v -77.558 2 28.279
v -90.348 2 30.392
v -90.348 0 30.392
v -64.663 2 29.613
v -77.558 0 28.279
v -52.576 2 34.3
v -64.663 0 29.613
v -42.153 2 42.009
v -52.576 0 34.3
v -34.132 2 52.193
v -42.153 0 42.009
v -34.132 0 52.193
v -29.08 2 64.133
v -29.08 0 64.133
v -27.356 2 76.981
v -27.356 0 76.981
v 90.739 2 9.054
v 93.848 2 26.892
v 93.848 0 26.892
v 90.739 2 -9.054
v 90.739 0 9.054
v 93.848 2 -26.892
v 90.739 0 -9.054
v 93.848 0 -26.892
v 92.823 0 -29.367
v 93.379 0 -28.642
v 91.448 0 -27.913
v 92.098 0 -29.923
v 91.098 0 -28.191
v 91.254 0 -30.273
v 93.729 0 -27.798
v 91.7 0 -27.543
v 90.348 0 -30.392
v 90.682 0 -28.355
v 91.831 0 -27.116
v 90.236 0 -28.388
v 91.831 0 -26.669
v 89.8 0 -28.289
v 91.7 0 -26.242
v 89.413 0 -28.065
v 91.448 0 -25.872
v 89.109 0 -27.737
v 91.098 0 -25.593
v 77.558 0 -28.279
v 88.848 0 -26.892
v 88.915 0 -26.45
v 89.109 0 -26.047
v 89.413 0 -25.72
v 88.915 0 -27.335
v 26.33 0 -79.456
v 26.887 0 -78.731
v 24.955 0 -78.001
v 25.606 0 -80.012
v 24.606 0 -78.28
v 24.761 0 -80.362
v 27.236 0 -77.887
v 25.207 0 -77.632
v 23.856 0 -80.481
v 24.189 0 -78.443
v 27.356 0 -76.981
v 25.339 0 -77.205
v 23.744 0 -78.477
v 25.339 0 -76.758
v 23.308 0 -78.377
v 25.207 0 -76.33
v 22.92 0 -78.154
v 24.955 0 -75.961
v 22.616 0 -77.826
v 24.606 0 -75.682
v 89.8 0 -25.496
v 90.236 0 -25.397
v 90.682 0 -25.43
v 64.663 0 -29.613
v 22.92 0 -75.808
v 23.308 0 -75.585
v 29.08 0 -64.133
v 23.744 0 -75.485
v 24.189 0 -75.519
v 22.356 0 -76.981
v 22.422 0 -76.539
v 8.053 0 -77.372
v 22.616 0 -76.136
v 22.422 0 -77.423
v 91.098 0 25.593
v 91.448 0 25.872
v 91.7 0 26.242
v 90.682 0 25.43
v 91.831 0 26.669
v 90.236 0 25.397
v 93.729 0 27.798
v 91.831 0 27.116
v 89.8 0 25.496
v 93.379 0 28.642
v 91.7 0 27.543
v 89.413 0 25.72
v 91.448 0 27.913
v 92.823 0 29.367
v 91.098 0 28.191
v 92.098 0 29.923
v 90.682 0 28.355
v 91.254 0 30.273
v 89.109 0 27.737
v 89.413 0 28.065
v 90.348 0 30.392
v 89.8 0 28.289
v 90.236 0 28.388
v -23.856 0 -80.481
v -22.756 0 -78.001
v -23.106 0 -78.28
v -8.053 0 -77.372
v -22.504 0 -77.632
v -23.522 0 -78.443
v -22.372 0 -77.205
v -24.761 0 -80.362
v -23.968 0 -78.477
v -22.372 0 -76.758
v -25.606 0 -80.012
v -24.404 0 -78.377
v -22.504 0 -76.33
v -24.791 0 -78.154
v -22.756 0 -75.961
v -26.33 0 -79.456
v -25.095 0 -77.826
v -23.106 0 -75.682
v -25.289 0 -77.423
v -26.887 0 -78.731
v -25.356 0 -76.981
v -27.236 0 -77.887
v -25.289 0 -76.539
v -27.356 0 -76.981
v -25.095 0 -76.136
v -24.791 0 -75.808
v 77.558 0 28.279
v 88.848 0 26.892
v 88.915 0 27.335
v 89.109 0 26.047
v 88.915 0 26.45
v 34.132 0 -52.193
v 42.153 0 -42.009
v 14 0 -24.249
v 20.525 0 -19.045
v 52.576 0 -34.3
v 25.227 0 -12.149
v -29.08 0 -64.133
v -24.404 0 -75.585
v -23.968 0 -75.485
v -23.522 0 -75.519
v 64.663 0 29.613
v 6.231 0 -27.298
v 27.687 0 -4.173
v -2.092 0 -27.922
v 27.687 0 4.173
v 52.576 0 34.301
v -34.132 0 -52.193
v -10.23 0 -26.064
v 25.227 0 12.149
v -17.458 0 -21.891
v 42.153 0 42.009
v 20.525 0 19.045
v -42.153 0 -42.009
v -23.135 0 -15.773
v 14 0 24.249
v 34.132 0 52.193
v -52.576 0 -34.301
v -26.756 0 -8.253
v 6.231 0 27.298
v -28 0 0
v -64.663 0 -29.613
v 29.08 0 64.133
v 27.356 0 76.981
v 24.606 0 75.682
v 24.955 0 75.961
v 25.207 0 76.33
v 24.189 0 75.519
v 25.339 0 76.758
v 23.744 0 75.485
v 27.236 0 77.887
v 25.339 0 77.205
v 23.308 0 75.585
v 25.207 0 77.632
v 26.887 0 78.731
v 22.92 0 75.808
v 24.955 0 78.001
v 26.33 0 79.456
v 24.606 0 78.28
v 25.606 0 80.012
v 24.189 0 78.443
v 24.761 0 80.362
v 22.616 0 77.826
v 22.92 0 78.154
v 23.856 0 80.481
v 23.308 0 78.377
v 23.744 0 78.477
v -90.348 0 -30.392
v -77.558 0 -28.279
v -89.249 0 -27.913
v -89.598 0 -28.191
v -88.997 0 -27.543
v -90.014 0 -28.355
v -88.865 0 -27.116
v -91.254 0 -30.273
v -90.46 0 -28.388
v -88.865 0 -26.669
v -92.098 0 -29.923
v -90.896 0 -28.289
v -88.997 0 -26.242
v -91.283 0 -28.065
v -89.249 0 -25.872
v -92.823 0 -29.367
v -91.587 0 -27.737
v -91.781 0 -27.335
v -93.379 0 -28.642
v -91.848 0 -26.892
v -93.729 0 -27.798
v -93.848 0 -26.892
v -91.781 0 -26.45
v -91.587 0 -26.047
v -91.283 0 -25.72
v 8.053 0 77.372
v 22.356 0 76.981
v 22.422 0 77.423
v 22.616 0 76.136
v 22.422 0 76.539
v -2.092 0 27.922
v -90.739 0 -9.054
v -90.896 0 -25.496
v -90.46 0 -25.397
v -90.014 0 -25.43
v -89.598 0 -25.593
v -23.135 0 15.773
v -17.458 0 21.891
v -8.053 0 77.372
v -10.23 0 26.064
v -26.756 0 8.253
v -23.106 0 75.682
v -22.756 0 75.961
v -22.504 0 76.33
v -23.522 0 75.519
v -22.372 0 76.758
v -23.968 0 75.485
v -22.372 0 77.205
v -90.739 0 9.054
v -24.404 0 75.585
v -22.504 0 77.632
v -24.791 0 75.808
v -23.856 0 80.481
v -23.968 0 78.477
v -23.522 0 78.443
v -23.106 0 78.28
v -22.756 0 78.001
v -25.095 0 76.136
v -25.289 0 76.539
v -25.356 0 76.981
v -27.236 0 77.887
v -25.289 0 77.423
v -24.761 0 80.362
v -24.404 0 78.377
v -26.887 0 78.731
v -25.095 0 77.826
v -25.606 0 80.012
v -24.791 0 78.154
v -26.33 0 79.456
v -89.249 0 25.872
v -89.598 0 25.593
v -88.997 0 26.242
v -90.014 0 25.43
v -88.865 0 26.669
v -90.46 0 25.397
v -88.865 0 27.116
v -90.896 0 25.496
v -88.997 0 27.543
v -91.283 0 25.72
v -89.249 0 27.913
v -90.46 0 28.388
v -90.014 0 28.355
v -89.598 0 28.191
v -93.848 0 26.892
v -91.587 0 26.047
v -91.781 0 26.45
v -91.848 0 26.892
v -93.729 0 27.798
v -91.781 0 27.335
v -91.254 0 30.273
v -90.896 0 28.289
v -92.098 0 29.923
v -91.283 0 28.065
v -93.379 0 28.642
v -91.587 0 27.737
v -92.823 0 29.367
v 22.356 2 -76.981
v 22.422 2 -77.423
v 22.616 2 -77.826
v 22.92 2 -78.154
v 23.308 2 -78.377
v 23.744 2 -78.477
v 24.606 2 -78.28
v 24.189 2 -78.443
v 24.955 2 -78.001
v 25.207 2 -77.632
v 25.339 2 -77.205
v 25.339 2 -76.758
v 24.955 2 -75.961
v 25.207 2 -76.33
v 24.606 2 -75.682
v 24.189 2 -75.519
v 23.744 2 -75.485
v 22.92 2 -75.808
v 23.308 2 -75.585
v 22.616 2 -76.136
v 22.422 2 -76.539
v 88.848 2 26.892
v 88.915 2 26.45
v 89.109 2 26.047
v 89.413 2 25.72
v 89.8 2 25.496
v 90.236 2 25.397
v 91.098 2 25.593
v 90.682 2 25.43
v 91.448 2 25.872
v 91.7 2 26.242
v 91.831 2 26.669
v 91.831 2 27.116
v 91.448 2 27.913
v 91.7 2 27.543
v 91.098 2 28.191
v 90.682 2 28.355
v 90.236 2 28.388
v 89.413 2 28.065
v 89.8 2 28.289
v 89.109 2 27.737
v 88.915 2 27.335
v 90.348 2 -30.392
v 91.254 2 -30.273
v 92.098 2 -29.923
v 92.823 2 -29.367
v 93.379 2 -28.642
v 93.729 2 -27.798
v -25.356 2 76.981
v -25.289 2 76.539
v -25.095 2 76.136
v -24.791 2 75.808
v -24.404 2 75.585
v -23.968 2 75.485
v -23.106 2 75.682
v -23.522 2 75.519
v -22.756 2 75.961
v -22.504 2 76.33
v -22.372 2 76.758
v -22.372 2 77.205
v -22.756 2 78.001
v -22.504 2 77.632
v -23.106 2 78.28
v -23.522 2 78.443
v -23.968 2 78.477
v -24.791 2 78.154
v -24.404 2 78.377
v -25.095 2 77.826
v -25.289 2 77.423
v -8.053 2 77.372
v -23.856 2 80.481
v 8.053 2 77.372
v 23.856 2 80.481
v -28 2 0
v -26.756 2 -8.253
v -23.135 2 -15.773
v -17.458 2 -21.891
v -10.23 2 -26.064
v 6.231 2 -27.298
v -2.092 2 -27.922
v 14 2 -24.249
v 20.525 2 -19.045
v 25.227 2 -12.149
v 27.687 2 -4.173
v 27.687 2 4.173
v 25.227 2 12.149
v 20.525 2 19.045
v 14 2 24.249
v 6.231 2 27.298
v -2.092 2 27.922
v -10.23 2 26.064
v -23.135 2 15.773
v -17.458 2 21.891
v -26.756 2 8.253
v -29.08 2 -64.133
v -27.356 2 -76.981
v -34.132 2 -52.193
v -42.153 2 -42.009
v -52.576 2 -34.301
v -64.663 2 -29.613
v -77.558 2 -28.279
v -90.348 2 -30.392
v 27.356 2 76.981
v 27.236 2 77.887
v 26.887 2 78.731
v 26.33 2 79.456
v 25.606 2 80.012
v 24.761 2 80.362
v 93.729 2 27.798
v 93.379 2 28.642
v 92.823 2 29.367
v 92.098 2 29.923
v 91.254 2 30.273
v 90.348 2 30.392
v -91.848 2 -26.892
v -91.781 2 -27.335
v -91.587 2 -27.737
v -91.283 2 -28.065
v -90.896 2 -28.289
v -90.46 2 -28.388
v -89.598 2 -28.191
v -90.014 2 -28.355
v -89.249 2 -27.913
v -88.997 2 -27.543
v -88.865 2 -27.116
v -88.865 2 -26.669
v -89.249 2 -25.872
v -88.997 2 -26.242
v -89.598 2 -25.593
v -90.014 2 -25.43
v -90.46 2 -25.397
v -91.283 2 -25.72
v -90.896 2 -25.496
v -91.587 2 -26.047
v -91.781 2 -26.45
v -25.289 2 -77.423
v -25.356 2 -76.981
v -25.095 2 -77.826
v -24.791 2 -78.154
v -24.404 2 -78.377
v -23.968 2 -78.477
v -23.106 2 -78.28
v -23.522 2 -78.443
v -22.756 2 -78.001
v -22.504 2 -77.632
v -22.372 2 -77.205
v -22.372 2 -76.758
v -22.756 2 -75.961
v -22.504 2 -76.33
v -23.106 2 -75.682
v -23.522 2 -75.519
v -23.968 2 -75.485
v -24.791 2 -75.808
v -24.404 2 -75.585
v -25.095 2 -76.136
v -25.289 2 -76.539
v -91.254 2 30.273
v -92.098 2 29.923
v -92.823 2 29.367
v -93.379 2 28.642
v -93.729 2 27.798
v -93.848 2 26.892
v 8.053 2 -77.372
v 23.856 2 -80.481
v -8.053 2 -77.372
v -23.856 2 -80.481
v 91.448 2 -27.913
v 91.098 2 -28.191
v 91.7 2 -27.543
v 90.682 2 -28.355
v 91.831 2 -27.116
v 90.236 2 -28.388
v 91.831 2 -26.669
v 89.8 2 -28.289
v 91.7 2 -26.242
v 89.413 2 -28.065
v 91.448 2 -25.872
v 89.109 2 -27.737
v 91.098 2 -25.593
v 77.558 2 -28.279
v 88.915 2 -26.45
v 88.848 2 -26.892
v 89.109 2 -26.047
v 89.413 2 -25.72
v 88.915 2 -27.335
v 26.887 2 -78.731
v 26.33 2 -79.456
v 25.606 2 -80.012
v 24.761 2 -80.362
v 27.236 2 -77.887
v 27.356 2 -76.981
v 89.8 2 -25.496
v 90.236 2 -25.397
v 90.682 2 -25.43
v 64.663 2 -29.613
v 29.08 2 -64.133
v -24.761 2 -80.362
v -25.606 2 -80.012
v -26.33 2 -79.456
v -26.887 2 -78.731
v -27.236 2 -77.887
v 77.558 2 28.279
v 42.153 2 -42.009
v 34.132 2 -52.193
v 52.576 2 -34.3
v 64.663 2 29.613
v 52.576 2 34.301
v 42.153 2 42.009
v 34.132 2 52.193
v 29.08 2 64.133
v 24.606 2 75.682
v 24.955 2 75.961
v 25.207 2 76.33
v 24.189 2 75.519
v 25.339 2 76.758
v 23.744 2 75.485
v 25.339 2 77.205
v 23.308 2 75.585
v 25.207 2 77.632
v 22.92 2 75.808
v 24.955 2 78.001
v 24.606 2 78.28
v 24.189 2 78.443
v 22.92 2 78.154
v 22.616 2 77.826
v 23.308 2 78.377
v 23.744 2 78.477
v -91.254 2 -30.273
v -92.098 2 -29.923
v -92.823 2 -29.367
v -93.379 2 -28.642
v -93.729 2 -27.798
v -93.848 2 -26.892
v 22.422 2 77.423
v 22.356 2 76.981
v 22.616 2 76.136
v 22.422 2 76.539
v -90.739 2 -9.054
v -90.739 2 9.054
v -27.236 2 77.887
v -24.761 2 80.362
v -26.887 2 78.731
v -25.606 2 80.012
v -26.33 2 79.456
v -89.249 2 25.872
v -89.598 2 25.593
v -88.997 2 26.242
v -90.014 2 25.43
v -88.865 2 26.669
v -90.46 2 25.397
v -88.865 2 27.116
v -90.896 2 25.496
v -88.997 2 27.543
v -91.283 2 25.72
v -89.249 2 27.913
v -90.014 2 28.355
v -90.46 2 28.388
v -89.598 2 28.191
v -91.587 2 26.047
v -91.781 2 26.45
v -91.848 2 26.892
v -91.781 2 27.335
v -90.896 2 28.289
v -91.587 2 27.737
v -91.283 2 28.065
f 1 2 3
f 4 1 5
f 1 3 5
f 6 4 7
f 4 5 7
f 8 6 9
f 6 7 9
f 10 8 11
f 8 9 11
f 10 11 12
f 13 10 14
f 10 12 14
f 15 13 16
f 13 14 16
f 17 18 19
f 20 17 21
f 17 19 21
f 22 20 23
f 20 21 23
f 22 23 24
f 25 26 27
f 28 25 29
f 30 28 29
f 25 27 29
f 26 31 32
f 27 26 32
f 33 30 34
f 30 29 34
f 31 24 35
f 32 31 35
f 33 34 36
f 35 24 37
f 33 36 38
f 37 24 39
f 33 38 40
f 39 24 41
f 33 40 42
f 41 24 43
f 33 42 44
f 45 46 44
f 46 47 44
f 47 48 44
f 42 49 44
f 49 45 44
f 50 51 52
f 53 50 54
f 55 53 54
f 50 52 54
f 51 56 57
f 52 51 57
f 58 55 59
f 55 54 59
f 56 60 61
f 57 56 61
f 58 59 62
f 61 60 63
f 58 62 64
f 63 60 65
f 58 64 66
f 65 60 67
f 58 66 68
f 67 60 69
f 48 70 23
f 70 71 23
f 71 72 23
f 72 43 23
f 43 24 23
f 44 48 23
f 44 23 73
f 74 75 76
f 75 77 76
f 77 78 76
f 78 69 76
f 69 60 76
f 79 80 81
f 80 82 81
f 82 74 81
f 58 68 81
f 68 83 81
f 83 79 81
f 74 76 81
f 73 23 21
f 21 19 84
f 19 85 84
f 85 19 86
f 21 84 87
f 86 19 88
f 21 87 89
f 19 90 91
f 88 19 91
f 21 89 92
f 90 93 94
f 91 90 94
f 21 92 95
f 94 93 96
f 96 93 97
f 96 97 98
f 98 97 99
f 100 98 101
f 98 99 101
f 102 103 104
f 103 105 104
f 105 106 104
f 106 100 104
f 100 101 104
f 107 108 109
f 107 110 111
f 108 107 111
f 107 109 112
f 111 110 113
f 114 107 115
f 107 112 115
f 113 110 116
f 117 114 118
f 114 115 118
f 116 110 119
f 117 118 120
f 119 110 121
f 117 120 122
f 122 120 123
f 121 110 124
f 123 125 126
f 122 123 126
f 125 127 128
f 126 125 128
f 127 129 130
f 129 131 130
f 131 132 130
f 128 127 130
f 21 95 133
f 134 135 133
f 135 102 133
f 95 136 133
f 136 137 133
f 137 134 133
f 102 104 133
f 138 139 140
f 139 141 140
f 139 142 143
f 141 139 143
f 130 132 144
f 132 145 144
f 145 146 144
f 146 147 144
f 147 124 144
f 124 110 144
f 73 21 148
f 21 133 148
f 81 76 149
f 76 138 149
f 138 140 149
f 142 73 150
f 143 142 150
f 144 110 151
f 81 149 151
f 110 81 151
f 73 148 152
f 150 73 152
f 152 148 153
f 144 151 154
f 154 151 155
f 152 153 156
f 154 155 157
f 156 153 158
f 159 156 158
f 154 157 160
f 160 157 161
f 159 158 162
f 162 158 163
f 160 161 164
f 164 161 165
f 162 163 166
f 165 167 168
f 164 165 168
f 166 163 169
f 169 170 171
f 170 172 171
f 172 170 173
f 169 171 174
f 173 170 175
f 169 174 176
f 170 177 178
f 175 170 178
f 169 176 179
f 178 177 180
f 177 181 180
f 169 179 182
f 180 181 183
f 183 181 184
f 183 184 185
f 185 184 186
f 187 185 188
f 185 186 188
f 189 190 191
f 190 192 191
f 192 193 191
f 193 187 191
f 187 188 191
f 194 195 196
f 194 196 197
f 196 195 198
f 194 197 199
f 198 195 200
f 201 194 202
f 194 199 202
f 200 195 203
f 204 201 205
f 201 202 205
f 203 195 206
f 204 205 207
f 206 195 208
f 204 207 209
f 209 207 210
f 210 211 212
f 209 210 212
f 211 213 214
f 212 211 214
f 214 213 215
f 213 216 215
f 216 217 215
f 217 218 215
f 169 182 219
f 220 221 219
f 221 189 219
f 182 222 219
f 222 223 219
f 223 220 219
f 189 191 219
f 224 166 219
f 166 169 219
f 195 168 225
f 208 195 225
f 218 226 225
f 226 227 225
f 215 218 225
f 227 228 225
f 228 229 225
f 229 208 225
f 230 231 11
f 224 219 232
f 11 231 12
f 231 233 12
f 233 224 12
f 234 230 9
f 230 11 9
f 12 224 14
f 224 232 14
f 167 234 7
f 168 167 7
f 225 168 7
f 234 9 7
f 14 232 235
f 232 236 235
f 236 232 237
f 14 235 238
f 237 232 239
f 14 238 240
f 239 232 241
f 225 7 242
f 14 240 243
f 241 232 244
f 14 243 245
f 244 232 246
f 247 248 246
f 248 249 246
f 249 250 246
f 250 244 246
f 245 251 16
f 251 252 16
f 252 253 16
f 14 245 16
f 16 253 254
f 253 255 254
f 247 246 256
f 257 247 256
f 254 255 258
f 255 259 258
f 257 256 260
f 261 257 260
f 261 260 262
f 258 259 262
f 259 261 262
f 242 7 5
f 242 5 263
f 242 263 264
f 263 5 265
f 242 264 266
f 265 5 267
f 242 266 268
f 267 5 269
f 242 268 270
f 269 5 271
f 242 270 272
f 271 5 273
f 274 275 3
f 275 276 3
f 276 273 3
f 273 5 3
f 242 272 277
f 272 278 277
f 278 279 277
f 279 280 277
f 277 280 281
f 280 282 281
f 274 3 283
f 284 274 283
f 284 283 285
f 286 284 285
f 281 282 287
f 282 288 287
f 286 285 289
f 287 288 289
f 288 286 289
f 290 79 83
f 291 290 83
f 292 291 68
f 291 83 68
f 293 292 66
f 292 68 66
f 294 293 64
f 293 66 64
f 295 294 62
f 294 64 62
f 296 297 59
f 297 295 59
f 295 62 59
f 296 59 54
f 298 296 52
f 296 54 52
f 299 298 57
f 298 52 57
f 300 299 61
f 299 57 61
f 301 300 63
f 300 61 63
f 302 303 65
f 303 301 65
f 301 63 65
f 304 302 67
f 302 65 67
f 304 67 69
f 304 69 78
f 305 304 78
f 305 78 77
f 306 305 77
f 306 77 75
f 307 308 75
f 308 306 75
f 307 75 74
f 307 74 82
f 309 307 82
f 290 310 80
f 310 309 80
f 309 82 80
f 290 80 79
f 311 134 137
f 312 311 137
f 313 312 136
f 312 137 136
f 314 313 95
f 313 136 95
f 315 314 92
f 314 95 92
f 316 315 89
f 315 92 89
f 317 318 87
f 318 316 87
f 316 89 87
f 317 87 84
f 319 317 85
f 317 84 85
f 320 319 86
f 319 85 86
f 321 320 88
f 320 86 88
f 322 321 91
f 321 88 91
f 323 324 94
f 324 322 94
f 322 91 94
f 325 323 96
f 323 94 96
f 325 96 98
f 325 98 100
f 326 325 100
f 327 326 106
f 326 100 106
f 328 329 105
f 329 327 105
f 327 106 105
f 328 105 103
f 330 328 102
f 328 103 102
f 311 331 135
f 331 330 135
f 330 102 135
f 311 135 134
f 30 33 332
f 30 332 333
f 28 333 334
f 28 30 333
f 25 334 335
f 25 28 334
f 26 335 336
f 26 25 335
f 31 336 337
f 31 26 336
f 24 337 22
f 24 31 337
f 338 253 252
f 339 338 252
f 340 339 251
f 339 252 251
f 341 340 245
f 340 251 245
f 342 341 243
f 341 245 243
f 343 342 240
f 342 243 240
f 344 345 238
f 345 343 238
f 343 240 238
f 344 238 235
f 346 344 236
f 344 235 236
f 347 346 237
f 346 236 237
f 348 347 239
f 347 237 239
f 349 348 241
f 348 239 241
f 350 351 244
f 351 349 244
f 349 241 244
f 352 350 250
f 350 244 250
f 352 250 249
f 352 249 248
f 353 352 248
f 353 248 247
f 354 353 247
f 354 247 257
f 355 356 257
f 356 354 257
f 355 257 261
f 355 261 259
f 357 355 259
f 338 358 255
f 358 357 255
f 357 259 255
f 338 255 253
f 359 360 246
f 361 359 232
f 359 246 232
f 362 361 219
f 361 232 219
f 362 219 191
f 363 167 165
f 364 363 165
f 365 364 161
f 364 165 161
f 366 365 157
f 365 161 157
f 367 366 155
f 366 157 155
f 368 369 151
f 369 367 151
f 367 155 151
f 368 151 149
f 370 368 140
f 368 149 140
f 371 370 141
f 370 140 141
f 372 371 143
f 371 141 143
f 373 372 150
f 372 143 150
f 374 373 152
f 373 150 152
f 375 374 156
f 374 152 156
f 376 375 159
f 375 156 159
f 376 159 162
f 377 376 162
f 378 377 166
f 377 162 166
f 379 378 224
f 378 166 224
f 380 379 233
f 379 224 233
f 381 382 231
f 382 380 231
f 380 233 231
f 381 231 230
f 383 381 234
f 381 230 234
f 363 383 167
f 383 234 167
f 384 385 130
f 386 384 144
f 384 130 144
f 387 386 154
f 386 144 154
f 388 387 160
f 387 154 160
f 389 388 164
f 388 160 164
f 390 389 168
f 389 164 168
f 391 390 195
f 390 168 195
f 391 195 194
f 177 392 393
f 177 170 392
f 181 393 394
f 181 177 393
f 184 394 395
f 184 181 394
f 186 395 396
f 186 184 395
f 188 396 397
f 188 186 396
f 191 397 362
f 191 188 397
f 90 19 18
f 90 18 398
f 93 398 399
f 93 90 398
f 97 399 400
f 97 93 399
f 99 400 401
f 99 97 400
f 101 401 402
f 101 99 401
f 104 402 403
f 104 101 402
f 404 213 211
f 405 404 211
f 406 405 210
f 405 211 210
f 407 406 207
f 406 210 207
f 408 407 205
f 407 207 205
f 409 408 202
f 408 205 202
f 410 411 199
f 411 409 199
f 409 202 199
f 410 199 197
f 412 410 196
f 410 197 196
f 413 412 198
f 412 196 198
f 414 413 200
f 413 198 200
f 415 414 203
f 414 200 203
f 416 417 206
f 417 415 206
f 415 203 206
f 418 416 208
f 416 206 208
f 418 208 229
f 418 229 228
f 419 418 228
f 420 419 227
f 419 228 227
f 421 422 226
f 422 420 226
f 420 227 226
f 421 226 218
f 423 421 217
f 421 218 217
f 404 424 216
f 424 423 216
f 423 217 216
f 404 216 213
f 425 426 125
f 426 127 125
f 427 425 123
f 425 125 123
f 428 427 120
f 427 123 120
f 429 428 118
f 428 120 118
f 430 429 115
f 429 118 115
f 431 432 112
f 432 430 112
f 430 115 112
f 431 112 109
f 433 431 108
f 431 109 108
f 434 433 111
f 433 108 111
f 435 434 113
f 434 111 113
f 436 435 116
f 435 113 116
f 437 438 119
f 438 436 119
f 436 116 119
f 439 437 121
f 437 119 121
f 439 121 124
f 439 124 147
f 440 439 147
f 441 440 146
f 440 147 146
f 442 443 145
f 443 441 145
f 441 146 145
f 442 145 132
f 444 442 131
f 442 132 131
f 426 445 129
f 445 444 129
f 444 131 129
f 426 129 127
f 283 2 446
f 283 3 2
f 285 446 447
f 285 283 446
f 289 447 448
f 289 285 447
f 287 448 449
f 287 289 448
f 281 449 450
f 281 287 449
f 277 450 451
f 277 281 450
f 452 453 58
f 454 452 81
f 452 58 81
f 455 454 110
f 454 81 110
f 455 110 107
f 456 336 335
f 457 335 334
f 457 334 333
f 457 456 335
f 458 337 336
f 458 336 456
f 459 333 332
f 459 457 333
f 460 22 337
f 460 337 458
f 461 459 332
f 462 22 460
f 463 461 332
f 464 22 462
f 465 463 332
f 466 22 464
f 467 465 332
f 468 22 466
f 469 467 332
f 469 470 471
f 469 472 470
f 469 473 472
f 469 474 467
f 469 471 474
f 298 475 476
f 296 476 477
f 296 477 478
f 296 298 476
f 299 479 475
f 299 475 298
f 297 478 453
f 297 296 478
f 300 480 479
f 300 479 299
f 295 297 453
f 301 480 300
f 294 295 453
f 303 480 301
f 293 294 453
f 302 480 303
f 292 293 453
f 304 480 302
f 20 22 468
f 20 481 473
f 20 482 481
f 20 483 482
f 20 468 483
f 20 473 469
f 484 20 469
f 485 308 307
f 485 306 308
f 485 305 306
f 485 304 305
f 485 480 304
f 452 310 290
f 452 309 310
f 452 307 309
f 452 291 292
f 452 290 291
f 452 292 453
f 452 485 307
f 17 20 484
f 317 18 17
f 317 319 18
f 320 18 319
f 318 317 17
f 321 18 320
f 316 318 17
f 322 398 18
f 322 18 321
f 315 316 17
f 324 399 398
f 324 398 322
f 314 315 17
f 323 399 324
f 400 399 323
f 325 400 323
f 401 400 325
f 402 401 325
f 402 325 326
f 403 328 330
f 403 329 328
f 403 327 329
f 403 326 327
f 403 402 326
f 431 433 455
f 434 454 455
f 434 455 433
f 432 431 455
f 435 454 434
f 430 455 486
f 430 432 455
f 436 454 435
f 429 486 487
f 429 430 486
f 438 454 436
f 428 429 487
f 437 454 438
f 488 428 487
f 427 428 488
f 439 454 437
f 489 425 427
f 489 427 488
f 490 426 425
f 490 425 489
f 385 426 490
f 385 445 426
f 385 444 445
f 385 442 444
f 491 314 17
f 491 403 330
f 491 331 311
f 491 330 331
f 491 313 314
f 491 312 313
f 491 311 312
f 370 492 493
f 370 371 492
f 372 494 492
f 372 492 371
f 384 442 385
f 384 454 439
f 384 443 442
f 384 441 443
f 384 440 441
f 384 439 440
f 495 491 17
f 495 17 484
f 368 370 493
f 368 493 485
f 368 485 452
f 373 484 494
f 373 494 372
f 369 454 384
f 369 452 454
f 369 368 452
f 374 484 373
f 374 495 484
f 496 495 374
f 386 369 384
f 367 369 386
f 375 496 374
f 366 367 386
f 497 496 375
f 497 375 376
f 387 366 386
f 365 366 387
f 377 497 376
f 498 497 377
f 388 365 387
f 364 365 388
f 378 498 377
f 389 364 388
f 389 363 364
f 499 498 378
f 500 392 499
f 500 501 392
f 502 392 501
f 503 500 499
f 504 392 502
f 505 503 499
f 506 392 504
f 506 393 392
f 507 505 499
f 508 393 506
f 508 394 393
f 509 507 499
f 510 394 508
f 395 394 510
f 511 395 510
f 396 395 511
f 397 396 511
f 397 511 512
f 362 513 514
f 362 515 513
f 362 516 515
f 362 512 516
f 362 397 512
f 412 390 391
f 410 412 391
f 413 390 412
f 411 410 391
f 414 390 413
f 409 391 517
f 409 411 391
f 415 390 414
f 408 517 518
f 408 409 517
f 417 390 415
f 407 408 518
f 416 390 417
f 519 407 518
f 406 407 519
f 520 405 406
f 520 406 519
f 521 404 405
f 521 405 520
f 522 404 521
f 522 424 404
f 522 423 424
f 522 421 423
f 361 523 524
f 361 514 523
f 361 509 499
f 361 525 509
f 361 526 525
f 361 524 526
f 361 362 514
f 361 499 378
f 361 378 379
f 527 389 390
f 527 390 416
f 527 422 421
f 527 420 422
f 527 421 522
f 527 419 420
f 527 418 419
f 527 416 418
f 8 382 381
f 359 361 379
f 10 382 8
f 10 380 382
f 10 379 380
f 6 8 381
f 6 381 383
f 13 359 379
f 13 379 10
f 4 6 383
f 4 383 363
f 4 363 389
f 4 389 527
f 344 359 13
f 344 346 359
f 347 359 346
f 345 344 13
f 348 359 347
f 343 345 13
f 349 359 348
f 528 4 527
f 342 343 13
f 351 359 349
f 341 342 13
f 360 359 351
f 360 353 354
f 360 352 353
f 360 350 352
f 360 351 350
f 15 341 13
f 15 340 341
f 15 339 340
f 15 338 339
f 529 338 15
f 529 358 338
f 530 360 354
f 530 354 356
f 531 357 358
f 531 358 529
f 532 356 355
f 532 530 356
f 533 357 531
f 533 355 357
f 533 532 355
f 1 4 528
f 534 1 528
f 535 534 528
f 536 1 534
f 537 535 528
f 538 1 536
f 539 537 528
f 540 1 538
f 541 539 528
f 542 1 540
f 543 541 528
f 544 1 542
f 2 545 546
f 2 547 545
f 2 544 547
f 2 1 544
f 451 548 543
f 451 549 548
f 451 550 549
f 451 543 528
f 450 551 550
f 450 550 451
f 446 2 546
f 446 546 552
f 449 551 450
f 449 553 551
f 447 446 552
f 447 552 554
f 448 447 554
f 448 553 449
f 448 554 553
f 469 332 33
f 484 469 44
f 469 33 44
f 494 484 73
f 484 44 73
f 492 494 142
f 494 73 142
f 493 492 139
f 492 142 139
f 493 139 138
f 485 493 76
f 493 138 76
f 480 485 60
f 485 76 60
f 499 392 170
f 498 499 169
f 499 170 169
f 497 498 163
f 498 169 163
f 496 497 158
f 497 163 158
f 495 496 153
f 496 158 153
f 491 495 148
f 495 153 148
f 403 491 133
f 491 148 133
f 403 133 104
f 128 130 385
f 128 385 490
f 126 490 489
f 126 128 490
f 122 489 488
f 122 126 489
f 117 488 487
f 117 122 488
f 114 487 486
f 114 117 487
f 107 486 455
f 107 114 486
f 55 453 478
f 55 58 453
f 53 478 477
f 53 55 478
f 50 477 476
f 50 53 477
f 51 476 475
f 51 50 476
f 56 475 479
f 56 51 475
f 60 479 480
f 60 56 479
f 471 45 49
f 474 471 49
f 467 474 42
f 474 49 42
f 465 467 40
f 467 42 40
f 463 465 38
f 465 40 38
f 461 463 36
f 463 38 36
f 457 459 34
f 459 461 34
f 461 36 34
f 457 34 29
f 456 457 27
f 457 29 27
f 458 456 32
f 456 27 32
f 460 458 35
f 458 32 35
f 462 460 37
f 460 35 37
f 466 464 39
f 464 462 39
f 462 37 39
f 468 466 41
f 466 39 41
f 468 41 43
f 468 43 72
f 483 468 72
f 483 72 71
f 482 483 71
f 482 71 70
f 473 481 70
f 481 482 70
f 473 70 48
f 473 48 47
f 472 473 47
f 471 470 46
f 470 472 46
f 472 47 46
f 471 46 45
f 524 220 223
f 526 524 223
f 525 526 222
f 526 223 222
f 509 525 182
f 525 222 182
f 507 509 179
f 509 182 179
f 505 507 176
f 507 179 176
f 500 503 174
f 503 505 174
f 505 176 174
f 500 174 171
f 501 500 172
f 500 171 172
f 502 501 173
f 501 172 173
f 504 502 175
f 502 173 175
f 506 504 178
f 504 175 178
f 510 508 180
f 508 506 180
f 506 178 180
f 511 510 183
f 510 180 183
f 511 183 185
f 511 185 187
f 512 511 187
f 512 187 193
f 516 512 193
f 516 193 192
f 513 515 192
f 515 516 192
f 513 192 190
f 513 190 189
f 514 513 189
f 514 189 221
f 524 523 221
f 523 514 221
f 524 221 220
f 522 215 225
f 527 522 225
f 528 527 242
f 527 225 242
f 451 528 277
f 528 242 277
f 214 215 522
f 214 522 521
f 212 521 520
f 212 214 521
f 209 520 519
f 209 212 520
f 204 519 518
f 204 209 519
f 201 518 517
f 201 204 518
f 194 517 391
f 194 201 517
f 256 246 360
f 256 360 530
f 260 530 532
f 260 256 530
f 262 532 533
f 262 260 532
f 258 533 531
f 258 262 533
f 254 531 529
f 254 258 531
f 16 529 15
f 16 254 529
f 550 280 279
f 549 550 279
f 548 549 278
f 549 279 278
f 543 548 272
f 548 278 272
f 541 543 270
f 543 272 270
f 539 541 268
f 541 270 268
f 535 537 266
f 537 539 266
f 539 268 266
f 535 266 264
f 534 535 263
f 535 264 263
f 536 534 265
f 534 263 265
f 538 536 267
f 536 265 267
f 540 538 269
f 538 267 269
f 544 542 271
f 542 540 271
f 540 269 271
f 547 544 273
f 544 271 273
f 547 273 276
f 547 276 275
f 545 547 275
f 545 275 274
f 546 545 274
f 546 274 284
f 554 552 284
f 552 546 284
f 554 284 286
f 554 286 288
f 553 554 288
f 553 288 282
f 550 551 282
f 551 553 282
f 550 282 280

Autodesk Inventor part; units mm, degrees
ref_plane "YZ Plane" through (0, 0, 0) normal (1, 0, 0) x (0, 1, 0)
ref_plane "XZ Plane" through (0, 0, 0) normal (0, 1, 0) x (-1, 0, 0)
ref_plane "XY Plane" through (0, 0, 0) normal (0, 0, 1) x (1, 0, 0)
sketch "Эскиз1" plane through (0, 2, -127) normal (0, 1, 0) x (1, 0, 0)
  circle A0 centre (-90.3481, -100.1076) radius 1.5
  circle A1 centre (90.3481, -153.8924) radius 1.5
  circle A2 centre (-90.3481, -153.8924) radius 1.5
  circle A3 centre (90.3481, -100.1076) radius 1.5
  circle A4 centre (51.0265, -155.3991) radius 1.5
  circle A5 centre (-67.0849, -171.4575) radius 1.5
  circle A6 centre (-44.4575, -59.9151) radius 1.5
  circle A7 centre (51.0265, -98.6009) radius 1.5
  circle A8 centre (28.3991, -75.9735) radius 1.5
  circle A9 centre (-67.0849, -82.5425) radius 1.5
  circle A10 centre (-28.3991, -178.0265) radius 1.5
  circle A11 centre (28.3991, -178.0265) radius 1.5
  circle A12 centre (67.0849, -171.4575) radius 1.5
  circle A13 centre (-51.0265, -155.3991) radius 1.5
  circle A14 centre (-28.3991, -75.9735) radius 1.5
  circle A15 centre (67.0849, -82.5425) radius 1.5
  circle A16 centre (44.4575, -59.9151) radius 1.5
  circle A17 centre (-51.0265, -98.6009) radius 1.5
  circle A18 centre (-44.4575, -194.0849) radius 1.5
  circle A19 centre (44.4575, -194.0849) radius 1.5
  arc A20 (-36.9892, -29.8002) -> (36.9892, -29.8002) centre (0, 0) ccw
  arc A21 (-36.9892, -29.8002) -> (-48.2758, -34.8835) centre (0, -127) ccw
  line L0 (-48.2758, -34.8835) -> (-38.4471, -44.7123)
  line L1 (-38.4471, -44.7123) -> (-82.2877, -88.5529)
  line L2 (-82.2877, -88.5529) -> (-92.1165, -78.7242)
  arc A22 (-92.1165, -78.7242) -> (-92.1165, -175.2758) centre (0, -127) ccw
  line L3 (-92.1165, -175.2758) -> (-82.2877, -165.4471)
  line L4 (-82.2877, -165.4471) -> (-38.4471, -209.2877)
  line L5 (-38.4471, -209.2877) -> (-48.2758, -219.1165)
  arc A23 (-48.2758, -219.1165) -> (-36.9892, -224.1998) centre (0, -127) ccw
  arc A24 (36.9892, -224.1998) -> (-36.9892, -224.1998) centre (0, -254) ccw
  arc A25 (36.9892, -224.1998) -> (48.2758, -219.1165) centre (0, -127) ccw
  line L6 (48.2758, -219.1165) -> (38.4471, -209.2877)
  line L7 (38.4471, -209.2877) -> (82.2877, -165.4471)
  line L8 (82.2877, -165.4471) -> (92.1165, -175.2758)
  arc A26 (92.1165, -175.2758) -> (92.1165, -78.7242) centre (0, -127) ccw
  line L9 (92.1165, -78.7242) -> (82.2877, -88.5529)
  line L10 (82.2877, -88.5529) -> (38.4471, -44.7123)
  line L11 (38.4471, -44.7123) -> (48.2758, -34.8835)
  arc A27 (48.2758, -34.8835) -> (36.9892, -29.8002) centre (0, -127) ccw
  line L12 (-67.0849, -82.5425) -> (-51.0265, -98.6009) construction
  circle A28 centre (0, -127) radius 69.3873
  line L13 (-62.0891, -96.0236) -> (-51.0265, -107.0862)
  line L14 (-51.0265, -107.0862) -> (-19.9138, -75.9735)
  line L15 (-19.9138, -75.9735) -> (-30.9764, -64.9109)
  line L16 (-51.0265, -146.9138) -> (-62.0891, -157.9764)
  line L17 (-19.9138, -178.0265) -> (-51.0265, -146.9138)
  line L18 (-30.9764, -189.0891) -> (-19.9138, -178.0265)
  line L19 (19.9138, -178.0265) -> (30.9764, -189.0891)
  line L20 (51.0265, -146.9138) -> (19.9138, -178.0265)
  line L21 (62.0891, -157.9764) -> (51.0265, -146.9138)
  line L22 (51.0265, -107.0862) -> (62.0891, -96.0236)
  line L23 (19.9138, -75.9735) -> (51.0265, -107.0862)
  line L24 (30.9764, -64.9109) -> (19.9138, -75.9735)
  point P0 (-59.0557, -90.5717)
sketch "Эскиз2_1" plane through (0, 2, 127) normal (0, 1, 0) x (1, 0, 0)
  circle A0 centre (0, 127) radius 104
  line L0 (-92.1165, 78.7242) -> (-82.2877, 88.5529)
  line L1 (-82.2877, 88.5529) -> (-38.4471, 44.7123)
  line L2 (-38.4471, 44.7123) -> (-48.2758, 34.8835)
  line L3 (48.2758, 34.8835) -> (38.4471, 44.7123)
  line L4 (38.4471, 44.7123) -> (82.2877, 88.5529)
  line L5 (82.2877, 88.5529) -> (92.1165, 78.7242)
  line L6 (82.2877, 165.4471) -> (38.4471, 209.2877)
  line L7 (38.4471, 209.2877) -> (48.2758, 219.1165)
  line L8 (92.1165, 175.2758) -> (82.2877, 165.4471)
  line L9 (-48.2758, 219.1165) -> (-38.4471, 209.2877)
  line L10 (-38.4471, 209.2877) -> (-82.2877, 165.4471)
  line L11 (-82.2877, 165.4471) -> (-92.1165, 175.2758)
sketch "Эскиз3" plane through (0, 2, 127) normal (0, 1, 0) x (1, 0, 0)
  circle A0 centre (-23.8556, 50.0189) radius 1.5
  circle A1 centre (23.8556, 50.0189) radius 1.5
  circle A2 centre (-23.8556, 203.9811) radius 1.5
  circle A3 centre (23.8556, 203.9811) radius 1.5
  point P0 (0, 127)
sketch "Эскиз6" plane through (0, 0, 0) normal (0, 1, 0) x (-1, 0, 0)
  circle A0 centre (0, 0) radius 49.5
  circle A1 centre (0, 0) radius 41
  dimension "d1" = 99
  dimension "d2" = 82
sketch "Эскиз7" plane through (0, 0, 0) normal (0, 1, 0) x (-1, 0, 0)
  circle A0 centre (90.3481, 26.8924) radius 1.5 projected
  circle A1 centre (90.3481, -26.8924) radius 1.5 projected
  circle A2 centre (23.8556, 76.9811) radius 1.5 projected
  circle A3 centre (23.8556, -76.9811) radius 1.5 projected
  circle A4 centre (-23.8556, -76.9811) radius 1.5 projected
  circle A5 centre (-23.8556, 76.9811) radius 1.5 projected
  circle A6 centre (-90.3481, 26.8924) radius 1.5 projected
  circle A7 centre (-90.3481, -26.8924) radius 1.5 projected
  circle A8 centre (0, 0) radius 28
  circle A9 centre (90.3481, 26.8924) radius 3.5
  circle A10 centre (90.3481, -26.8924) radius 3.5
  circle A11 centre (23.8556, -76.9811) radius 3.5
  circle A12 centre (-23.8556, -76.9811) radius 3.5
  circle A13 centre (-90.3481, -26.8924) radius 3.5
  circle A14 centre (-90.3481, 26.8924) radius 3.5
  circle A15 centre (23.8556, 76.9811) radius 3.5
  circle A16 centre (-23.8556, 76.9811) radius 3.5
  line L0 (0, 0) -> (28, 0) construction
  line L1 (23.8556, 76.9811) -> (27.3556, 76.9811) construction
  line L2 (90.3481, 26.8924) -> (90.3481, 30.3924) construction
  arc A17 (27.3556, 76.9811) -> (90.3481, 30.3924) centre (76.0802, 76.9811) ccw
  line L3 (27.3556, 76.9811) -> (27.3556, 30.3924) construction
  line L4 (27.3556, 30.3924) -> (90.3481, 30.3924) construction
  arc A18 (90.3481, -30.3924) -> (27.3556, -76.9811) centre (76.0802, -76.9811) ccw
  line L5 (0, 0) -> (0, 28) construction
  arc A19 (-90.3481, 30.3924) -> (-27.3556, 76.9811) centre (-76.0802, 76.9811) ccw
  arc A20 (-27.3556, -76.9811) -> (-90.3481, -30.3924) centre (-76.0802, -76.9811) ccw
  line L6 (90.3481, 26.8924) -> (93.8481, 26.8924) construction
  line L7 (90.3481, -26.8924) -> (93.8481, -26.8924) construction
  arc A21 (93.8481, 26.8924) -> (93.8481, -26.8924) centre (195.4124, 0) ccw
  arc A22 (-93.8481, -26.8924) -> (-93.8481, 26.8924) centre (-195.4124, 0) ccw
  line L8 (-23.8556, 76.9811) -> (-23.8556, 80.4811) construction
  line L9 (23.8556, 76.9811) -> (23.8556, 80.4811) construction
  arc A23 (-23.8556, 80.4811) -> (23.8556, 80.4811) centre (0, 160.0297) ccw
  arc A24 (23.8556, -80.4811) -> (-23.8556, -80.4811) centre (0, -160.0297) ccw
  point P0 (-27.3556, 76.9811)
  point P1 (-90.3481, 30.3924)
  point P2 (-93.8481, 26.8924)
  point P3 (-93.8481, -26.8924)
  point P4 (-90.3481, -30.3924)
  point P5 (-27.3556, -76.9811)
  point P6 (-23.8556, -80.4811)
  point P7 (23.8556, -80.4811)
  point P8 (90.3481, -30.3924)
  dimension "d3" = 56
  dimension "d4" = 7
extrude "Выдавливание1" add sketch "Эскиз7" along normal blind 2 contours A21 A9 A17 | A21 A10 A18 A11 A24 A12 A20 A13 A22 A14 A19 A16 A23 A15 A17 A9 | A21 A10 A18 | A15 A23 | A11 A24 | A16 A23 | A24 A12 | A14 A22 A19 | A20 A13 A22 picked at (26.6398, 76.5793) picked at (26.6398, -76.5793) picked at (-21.0707, 76.5822) picked at (-26.5069, -76.0401)
properties part number "dribler_floor"
